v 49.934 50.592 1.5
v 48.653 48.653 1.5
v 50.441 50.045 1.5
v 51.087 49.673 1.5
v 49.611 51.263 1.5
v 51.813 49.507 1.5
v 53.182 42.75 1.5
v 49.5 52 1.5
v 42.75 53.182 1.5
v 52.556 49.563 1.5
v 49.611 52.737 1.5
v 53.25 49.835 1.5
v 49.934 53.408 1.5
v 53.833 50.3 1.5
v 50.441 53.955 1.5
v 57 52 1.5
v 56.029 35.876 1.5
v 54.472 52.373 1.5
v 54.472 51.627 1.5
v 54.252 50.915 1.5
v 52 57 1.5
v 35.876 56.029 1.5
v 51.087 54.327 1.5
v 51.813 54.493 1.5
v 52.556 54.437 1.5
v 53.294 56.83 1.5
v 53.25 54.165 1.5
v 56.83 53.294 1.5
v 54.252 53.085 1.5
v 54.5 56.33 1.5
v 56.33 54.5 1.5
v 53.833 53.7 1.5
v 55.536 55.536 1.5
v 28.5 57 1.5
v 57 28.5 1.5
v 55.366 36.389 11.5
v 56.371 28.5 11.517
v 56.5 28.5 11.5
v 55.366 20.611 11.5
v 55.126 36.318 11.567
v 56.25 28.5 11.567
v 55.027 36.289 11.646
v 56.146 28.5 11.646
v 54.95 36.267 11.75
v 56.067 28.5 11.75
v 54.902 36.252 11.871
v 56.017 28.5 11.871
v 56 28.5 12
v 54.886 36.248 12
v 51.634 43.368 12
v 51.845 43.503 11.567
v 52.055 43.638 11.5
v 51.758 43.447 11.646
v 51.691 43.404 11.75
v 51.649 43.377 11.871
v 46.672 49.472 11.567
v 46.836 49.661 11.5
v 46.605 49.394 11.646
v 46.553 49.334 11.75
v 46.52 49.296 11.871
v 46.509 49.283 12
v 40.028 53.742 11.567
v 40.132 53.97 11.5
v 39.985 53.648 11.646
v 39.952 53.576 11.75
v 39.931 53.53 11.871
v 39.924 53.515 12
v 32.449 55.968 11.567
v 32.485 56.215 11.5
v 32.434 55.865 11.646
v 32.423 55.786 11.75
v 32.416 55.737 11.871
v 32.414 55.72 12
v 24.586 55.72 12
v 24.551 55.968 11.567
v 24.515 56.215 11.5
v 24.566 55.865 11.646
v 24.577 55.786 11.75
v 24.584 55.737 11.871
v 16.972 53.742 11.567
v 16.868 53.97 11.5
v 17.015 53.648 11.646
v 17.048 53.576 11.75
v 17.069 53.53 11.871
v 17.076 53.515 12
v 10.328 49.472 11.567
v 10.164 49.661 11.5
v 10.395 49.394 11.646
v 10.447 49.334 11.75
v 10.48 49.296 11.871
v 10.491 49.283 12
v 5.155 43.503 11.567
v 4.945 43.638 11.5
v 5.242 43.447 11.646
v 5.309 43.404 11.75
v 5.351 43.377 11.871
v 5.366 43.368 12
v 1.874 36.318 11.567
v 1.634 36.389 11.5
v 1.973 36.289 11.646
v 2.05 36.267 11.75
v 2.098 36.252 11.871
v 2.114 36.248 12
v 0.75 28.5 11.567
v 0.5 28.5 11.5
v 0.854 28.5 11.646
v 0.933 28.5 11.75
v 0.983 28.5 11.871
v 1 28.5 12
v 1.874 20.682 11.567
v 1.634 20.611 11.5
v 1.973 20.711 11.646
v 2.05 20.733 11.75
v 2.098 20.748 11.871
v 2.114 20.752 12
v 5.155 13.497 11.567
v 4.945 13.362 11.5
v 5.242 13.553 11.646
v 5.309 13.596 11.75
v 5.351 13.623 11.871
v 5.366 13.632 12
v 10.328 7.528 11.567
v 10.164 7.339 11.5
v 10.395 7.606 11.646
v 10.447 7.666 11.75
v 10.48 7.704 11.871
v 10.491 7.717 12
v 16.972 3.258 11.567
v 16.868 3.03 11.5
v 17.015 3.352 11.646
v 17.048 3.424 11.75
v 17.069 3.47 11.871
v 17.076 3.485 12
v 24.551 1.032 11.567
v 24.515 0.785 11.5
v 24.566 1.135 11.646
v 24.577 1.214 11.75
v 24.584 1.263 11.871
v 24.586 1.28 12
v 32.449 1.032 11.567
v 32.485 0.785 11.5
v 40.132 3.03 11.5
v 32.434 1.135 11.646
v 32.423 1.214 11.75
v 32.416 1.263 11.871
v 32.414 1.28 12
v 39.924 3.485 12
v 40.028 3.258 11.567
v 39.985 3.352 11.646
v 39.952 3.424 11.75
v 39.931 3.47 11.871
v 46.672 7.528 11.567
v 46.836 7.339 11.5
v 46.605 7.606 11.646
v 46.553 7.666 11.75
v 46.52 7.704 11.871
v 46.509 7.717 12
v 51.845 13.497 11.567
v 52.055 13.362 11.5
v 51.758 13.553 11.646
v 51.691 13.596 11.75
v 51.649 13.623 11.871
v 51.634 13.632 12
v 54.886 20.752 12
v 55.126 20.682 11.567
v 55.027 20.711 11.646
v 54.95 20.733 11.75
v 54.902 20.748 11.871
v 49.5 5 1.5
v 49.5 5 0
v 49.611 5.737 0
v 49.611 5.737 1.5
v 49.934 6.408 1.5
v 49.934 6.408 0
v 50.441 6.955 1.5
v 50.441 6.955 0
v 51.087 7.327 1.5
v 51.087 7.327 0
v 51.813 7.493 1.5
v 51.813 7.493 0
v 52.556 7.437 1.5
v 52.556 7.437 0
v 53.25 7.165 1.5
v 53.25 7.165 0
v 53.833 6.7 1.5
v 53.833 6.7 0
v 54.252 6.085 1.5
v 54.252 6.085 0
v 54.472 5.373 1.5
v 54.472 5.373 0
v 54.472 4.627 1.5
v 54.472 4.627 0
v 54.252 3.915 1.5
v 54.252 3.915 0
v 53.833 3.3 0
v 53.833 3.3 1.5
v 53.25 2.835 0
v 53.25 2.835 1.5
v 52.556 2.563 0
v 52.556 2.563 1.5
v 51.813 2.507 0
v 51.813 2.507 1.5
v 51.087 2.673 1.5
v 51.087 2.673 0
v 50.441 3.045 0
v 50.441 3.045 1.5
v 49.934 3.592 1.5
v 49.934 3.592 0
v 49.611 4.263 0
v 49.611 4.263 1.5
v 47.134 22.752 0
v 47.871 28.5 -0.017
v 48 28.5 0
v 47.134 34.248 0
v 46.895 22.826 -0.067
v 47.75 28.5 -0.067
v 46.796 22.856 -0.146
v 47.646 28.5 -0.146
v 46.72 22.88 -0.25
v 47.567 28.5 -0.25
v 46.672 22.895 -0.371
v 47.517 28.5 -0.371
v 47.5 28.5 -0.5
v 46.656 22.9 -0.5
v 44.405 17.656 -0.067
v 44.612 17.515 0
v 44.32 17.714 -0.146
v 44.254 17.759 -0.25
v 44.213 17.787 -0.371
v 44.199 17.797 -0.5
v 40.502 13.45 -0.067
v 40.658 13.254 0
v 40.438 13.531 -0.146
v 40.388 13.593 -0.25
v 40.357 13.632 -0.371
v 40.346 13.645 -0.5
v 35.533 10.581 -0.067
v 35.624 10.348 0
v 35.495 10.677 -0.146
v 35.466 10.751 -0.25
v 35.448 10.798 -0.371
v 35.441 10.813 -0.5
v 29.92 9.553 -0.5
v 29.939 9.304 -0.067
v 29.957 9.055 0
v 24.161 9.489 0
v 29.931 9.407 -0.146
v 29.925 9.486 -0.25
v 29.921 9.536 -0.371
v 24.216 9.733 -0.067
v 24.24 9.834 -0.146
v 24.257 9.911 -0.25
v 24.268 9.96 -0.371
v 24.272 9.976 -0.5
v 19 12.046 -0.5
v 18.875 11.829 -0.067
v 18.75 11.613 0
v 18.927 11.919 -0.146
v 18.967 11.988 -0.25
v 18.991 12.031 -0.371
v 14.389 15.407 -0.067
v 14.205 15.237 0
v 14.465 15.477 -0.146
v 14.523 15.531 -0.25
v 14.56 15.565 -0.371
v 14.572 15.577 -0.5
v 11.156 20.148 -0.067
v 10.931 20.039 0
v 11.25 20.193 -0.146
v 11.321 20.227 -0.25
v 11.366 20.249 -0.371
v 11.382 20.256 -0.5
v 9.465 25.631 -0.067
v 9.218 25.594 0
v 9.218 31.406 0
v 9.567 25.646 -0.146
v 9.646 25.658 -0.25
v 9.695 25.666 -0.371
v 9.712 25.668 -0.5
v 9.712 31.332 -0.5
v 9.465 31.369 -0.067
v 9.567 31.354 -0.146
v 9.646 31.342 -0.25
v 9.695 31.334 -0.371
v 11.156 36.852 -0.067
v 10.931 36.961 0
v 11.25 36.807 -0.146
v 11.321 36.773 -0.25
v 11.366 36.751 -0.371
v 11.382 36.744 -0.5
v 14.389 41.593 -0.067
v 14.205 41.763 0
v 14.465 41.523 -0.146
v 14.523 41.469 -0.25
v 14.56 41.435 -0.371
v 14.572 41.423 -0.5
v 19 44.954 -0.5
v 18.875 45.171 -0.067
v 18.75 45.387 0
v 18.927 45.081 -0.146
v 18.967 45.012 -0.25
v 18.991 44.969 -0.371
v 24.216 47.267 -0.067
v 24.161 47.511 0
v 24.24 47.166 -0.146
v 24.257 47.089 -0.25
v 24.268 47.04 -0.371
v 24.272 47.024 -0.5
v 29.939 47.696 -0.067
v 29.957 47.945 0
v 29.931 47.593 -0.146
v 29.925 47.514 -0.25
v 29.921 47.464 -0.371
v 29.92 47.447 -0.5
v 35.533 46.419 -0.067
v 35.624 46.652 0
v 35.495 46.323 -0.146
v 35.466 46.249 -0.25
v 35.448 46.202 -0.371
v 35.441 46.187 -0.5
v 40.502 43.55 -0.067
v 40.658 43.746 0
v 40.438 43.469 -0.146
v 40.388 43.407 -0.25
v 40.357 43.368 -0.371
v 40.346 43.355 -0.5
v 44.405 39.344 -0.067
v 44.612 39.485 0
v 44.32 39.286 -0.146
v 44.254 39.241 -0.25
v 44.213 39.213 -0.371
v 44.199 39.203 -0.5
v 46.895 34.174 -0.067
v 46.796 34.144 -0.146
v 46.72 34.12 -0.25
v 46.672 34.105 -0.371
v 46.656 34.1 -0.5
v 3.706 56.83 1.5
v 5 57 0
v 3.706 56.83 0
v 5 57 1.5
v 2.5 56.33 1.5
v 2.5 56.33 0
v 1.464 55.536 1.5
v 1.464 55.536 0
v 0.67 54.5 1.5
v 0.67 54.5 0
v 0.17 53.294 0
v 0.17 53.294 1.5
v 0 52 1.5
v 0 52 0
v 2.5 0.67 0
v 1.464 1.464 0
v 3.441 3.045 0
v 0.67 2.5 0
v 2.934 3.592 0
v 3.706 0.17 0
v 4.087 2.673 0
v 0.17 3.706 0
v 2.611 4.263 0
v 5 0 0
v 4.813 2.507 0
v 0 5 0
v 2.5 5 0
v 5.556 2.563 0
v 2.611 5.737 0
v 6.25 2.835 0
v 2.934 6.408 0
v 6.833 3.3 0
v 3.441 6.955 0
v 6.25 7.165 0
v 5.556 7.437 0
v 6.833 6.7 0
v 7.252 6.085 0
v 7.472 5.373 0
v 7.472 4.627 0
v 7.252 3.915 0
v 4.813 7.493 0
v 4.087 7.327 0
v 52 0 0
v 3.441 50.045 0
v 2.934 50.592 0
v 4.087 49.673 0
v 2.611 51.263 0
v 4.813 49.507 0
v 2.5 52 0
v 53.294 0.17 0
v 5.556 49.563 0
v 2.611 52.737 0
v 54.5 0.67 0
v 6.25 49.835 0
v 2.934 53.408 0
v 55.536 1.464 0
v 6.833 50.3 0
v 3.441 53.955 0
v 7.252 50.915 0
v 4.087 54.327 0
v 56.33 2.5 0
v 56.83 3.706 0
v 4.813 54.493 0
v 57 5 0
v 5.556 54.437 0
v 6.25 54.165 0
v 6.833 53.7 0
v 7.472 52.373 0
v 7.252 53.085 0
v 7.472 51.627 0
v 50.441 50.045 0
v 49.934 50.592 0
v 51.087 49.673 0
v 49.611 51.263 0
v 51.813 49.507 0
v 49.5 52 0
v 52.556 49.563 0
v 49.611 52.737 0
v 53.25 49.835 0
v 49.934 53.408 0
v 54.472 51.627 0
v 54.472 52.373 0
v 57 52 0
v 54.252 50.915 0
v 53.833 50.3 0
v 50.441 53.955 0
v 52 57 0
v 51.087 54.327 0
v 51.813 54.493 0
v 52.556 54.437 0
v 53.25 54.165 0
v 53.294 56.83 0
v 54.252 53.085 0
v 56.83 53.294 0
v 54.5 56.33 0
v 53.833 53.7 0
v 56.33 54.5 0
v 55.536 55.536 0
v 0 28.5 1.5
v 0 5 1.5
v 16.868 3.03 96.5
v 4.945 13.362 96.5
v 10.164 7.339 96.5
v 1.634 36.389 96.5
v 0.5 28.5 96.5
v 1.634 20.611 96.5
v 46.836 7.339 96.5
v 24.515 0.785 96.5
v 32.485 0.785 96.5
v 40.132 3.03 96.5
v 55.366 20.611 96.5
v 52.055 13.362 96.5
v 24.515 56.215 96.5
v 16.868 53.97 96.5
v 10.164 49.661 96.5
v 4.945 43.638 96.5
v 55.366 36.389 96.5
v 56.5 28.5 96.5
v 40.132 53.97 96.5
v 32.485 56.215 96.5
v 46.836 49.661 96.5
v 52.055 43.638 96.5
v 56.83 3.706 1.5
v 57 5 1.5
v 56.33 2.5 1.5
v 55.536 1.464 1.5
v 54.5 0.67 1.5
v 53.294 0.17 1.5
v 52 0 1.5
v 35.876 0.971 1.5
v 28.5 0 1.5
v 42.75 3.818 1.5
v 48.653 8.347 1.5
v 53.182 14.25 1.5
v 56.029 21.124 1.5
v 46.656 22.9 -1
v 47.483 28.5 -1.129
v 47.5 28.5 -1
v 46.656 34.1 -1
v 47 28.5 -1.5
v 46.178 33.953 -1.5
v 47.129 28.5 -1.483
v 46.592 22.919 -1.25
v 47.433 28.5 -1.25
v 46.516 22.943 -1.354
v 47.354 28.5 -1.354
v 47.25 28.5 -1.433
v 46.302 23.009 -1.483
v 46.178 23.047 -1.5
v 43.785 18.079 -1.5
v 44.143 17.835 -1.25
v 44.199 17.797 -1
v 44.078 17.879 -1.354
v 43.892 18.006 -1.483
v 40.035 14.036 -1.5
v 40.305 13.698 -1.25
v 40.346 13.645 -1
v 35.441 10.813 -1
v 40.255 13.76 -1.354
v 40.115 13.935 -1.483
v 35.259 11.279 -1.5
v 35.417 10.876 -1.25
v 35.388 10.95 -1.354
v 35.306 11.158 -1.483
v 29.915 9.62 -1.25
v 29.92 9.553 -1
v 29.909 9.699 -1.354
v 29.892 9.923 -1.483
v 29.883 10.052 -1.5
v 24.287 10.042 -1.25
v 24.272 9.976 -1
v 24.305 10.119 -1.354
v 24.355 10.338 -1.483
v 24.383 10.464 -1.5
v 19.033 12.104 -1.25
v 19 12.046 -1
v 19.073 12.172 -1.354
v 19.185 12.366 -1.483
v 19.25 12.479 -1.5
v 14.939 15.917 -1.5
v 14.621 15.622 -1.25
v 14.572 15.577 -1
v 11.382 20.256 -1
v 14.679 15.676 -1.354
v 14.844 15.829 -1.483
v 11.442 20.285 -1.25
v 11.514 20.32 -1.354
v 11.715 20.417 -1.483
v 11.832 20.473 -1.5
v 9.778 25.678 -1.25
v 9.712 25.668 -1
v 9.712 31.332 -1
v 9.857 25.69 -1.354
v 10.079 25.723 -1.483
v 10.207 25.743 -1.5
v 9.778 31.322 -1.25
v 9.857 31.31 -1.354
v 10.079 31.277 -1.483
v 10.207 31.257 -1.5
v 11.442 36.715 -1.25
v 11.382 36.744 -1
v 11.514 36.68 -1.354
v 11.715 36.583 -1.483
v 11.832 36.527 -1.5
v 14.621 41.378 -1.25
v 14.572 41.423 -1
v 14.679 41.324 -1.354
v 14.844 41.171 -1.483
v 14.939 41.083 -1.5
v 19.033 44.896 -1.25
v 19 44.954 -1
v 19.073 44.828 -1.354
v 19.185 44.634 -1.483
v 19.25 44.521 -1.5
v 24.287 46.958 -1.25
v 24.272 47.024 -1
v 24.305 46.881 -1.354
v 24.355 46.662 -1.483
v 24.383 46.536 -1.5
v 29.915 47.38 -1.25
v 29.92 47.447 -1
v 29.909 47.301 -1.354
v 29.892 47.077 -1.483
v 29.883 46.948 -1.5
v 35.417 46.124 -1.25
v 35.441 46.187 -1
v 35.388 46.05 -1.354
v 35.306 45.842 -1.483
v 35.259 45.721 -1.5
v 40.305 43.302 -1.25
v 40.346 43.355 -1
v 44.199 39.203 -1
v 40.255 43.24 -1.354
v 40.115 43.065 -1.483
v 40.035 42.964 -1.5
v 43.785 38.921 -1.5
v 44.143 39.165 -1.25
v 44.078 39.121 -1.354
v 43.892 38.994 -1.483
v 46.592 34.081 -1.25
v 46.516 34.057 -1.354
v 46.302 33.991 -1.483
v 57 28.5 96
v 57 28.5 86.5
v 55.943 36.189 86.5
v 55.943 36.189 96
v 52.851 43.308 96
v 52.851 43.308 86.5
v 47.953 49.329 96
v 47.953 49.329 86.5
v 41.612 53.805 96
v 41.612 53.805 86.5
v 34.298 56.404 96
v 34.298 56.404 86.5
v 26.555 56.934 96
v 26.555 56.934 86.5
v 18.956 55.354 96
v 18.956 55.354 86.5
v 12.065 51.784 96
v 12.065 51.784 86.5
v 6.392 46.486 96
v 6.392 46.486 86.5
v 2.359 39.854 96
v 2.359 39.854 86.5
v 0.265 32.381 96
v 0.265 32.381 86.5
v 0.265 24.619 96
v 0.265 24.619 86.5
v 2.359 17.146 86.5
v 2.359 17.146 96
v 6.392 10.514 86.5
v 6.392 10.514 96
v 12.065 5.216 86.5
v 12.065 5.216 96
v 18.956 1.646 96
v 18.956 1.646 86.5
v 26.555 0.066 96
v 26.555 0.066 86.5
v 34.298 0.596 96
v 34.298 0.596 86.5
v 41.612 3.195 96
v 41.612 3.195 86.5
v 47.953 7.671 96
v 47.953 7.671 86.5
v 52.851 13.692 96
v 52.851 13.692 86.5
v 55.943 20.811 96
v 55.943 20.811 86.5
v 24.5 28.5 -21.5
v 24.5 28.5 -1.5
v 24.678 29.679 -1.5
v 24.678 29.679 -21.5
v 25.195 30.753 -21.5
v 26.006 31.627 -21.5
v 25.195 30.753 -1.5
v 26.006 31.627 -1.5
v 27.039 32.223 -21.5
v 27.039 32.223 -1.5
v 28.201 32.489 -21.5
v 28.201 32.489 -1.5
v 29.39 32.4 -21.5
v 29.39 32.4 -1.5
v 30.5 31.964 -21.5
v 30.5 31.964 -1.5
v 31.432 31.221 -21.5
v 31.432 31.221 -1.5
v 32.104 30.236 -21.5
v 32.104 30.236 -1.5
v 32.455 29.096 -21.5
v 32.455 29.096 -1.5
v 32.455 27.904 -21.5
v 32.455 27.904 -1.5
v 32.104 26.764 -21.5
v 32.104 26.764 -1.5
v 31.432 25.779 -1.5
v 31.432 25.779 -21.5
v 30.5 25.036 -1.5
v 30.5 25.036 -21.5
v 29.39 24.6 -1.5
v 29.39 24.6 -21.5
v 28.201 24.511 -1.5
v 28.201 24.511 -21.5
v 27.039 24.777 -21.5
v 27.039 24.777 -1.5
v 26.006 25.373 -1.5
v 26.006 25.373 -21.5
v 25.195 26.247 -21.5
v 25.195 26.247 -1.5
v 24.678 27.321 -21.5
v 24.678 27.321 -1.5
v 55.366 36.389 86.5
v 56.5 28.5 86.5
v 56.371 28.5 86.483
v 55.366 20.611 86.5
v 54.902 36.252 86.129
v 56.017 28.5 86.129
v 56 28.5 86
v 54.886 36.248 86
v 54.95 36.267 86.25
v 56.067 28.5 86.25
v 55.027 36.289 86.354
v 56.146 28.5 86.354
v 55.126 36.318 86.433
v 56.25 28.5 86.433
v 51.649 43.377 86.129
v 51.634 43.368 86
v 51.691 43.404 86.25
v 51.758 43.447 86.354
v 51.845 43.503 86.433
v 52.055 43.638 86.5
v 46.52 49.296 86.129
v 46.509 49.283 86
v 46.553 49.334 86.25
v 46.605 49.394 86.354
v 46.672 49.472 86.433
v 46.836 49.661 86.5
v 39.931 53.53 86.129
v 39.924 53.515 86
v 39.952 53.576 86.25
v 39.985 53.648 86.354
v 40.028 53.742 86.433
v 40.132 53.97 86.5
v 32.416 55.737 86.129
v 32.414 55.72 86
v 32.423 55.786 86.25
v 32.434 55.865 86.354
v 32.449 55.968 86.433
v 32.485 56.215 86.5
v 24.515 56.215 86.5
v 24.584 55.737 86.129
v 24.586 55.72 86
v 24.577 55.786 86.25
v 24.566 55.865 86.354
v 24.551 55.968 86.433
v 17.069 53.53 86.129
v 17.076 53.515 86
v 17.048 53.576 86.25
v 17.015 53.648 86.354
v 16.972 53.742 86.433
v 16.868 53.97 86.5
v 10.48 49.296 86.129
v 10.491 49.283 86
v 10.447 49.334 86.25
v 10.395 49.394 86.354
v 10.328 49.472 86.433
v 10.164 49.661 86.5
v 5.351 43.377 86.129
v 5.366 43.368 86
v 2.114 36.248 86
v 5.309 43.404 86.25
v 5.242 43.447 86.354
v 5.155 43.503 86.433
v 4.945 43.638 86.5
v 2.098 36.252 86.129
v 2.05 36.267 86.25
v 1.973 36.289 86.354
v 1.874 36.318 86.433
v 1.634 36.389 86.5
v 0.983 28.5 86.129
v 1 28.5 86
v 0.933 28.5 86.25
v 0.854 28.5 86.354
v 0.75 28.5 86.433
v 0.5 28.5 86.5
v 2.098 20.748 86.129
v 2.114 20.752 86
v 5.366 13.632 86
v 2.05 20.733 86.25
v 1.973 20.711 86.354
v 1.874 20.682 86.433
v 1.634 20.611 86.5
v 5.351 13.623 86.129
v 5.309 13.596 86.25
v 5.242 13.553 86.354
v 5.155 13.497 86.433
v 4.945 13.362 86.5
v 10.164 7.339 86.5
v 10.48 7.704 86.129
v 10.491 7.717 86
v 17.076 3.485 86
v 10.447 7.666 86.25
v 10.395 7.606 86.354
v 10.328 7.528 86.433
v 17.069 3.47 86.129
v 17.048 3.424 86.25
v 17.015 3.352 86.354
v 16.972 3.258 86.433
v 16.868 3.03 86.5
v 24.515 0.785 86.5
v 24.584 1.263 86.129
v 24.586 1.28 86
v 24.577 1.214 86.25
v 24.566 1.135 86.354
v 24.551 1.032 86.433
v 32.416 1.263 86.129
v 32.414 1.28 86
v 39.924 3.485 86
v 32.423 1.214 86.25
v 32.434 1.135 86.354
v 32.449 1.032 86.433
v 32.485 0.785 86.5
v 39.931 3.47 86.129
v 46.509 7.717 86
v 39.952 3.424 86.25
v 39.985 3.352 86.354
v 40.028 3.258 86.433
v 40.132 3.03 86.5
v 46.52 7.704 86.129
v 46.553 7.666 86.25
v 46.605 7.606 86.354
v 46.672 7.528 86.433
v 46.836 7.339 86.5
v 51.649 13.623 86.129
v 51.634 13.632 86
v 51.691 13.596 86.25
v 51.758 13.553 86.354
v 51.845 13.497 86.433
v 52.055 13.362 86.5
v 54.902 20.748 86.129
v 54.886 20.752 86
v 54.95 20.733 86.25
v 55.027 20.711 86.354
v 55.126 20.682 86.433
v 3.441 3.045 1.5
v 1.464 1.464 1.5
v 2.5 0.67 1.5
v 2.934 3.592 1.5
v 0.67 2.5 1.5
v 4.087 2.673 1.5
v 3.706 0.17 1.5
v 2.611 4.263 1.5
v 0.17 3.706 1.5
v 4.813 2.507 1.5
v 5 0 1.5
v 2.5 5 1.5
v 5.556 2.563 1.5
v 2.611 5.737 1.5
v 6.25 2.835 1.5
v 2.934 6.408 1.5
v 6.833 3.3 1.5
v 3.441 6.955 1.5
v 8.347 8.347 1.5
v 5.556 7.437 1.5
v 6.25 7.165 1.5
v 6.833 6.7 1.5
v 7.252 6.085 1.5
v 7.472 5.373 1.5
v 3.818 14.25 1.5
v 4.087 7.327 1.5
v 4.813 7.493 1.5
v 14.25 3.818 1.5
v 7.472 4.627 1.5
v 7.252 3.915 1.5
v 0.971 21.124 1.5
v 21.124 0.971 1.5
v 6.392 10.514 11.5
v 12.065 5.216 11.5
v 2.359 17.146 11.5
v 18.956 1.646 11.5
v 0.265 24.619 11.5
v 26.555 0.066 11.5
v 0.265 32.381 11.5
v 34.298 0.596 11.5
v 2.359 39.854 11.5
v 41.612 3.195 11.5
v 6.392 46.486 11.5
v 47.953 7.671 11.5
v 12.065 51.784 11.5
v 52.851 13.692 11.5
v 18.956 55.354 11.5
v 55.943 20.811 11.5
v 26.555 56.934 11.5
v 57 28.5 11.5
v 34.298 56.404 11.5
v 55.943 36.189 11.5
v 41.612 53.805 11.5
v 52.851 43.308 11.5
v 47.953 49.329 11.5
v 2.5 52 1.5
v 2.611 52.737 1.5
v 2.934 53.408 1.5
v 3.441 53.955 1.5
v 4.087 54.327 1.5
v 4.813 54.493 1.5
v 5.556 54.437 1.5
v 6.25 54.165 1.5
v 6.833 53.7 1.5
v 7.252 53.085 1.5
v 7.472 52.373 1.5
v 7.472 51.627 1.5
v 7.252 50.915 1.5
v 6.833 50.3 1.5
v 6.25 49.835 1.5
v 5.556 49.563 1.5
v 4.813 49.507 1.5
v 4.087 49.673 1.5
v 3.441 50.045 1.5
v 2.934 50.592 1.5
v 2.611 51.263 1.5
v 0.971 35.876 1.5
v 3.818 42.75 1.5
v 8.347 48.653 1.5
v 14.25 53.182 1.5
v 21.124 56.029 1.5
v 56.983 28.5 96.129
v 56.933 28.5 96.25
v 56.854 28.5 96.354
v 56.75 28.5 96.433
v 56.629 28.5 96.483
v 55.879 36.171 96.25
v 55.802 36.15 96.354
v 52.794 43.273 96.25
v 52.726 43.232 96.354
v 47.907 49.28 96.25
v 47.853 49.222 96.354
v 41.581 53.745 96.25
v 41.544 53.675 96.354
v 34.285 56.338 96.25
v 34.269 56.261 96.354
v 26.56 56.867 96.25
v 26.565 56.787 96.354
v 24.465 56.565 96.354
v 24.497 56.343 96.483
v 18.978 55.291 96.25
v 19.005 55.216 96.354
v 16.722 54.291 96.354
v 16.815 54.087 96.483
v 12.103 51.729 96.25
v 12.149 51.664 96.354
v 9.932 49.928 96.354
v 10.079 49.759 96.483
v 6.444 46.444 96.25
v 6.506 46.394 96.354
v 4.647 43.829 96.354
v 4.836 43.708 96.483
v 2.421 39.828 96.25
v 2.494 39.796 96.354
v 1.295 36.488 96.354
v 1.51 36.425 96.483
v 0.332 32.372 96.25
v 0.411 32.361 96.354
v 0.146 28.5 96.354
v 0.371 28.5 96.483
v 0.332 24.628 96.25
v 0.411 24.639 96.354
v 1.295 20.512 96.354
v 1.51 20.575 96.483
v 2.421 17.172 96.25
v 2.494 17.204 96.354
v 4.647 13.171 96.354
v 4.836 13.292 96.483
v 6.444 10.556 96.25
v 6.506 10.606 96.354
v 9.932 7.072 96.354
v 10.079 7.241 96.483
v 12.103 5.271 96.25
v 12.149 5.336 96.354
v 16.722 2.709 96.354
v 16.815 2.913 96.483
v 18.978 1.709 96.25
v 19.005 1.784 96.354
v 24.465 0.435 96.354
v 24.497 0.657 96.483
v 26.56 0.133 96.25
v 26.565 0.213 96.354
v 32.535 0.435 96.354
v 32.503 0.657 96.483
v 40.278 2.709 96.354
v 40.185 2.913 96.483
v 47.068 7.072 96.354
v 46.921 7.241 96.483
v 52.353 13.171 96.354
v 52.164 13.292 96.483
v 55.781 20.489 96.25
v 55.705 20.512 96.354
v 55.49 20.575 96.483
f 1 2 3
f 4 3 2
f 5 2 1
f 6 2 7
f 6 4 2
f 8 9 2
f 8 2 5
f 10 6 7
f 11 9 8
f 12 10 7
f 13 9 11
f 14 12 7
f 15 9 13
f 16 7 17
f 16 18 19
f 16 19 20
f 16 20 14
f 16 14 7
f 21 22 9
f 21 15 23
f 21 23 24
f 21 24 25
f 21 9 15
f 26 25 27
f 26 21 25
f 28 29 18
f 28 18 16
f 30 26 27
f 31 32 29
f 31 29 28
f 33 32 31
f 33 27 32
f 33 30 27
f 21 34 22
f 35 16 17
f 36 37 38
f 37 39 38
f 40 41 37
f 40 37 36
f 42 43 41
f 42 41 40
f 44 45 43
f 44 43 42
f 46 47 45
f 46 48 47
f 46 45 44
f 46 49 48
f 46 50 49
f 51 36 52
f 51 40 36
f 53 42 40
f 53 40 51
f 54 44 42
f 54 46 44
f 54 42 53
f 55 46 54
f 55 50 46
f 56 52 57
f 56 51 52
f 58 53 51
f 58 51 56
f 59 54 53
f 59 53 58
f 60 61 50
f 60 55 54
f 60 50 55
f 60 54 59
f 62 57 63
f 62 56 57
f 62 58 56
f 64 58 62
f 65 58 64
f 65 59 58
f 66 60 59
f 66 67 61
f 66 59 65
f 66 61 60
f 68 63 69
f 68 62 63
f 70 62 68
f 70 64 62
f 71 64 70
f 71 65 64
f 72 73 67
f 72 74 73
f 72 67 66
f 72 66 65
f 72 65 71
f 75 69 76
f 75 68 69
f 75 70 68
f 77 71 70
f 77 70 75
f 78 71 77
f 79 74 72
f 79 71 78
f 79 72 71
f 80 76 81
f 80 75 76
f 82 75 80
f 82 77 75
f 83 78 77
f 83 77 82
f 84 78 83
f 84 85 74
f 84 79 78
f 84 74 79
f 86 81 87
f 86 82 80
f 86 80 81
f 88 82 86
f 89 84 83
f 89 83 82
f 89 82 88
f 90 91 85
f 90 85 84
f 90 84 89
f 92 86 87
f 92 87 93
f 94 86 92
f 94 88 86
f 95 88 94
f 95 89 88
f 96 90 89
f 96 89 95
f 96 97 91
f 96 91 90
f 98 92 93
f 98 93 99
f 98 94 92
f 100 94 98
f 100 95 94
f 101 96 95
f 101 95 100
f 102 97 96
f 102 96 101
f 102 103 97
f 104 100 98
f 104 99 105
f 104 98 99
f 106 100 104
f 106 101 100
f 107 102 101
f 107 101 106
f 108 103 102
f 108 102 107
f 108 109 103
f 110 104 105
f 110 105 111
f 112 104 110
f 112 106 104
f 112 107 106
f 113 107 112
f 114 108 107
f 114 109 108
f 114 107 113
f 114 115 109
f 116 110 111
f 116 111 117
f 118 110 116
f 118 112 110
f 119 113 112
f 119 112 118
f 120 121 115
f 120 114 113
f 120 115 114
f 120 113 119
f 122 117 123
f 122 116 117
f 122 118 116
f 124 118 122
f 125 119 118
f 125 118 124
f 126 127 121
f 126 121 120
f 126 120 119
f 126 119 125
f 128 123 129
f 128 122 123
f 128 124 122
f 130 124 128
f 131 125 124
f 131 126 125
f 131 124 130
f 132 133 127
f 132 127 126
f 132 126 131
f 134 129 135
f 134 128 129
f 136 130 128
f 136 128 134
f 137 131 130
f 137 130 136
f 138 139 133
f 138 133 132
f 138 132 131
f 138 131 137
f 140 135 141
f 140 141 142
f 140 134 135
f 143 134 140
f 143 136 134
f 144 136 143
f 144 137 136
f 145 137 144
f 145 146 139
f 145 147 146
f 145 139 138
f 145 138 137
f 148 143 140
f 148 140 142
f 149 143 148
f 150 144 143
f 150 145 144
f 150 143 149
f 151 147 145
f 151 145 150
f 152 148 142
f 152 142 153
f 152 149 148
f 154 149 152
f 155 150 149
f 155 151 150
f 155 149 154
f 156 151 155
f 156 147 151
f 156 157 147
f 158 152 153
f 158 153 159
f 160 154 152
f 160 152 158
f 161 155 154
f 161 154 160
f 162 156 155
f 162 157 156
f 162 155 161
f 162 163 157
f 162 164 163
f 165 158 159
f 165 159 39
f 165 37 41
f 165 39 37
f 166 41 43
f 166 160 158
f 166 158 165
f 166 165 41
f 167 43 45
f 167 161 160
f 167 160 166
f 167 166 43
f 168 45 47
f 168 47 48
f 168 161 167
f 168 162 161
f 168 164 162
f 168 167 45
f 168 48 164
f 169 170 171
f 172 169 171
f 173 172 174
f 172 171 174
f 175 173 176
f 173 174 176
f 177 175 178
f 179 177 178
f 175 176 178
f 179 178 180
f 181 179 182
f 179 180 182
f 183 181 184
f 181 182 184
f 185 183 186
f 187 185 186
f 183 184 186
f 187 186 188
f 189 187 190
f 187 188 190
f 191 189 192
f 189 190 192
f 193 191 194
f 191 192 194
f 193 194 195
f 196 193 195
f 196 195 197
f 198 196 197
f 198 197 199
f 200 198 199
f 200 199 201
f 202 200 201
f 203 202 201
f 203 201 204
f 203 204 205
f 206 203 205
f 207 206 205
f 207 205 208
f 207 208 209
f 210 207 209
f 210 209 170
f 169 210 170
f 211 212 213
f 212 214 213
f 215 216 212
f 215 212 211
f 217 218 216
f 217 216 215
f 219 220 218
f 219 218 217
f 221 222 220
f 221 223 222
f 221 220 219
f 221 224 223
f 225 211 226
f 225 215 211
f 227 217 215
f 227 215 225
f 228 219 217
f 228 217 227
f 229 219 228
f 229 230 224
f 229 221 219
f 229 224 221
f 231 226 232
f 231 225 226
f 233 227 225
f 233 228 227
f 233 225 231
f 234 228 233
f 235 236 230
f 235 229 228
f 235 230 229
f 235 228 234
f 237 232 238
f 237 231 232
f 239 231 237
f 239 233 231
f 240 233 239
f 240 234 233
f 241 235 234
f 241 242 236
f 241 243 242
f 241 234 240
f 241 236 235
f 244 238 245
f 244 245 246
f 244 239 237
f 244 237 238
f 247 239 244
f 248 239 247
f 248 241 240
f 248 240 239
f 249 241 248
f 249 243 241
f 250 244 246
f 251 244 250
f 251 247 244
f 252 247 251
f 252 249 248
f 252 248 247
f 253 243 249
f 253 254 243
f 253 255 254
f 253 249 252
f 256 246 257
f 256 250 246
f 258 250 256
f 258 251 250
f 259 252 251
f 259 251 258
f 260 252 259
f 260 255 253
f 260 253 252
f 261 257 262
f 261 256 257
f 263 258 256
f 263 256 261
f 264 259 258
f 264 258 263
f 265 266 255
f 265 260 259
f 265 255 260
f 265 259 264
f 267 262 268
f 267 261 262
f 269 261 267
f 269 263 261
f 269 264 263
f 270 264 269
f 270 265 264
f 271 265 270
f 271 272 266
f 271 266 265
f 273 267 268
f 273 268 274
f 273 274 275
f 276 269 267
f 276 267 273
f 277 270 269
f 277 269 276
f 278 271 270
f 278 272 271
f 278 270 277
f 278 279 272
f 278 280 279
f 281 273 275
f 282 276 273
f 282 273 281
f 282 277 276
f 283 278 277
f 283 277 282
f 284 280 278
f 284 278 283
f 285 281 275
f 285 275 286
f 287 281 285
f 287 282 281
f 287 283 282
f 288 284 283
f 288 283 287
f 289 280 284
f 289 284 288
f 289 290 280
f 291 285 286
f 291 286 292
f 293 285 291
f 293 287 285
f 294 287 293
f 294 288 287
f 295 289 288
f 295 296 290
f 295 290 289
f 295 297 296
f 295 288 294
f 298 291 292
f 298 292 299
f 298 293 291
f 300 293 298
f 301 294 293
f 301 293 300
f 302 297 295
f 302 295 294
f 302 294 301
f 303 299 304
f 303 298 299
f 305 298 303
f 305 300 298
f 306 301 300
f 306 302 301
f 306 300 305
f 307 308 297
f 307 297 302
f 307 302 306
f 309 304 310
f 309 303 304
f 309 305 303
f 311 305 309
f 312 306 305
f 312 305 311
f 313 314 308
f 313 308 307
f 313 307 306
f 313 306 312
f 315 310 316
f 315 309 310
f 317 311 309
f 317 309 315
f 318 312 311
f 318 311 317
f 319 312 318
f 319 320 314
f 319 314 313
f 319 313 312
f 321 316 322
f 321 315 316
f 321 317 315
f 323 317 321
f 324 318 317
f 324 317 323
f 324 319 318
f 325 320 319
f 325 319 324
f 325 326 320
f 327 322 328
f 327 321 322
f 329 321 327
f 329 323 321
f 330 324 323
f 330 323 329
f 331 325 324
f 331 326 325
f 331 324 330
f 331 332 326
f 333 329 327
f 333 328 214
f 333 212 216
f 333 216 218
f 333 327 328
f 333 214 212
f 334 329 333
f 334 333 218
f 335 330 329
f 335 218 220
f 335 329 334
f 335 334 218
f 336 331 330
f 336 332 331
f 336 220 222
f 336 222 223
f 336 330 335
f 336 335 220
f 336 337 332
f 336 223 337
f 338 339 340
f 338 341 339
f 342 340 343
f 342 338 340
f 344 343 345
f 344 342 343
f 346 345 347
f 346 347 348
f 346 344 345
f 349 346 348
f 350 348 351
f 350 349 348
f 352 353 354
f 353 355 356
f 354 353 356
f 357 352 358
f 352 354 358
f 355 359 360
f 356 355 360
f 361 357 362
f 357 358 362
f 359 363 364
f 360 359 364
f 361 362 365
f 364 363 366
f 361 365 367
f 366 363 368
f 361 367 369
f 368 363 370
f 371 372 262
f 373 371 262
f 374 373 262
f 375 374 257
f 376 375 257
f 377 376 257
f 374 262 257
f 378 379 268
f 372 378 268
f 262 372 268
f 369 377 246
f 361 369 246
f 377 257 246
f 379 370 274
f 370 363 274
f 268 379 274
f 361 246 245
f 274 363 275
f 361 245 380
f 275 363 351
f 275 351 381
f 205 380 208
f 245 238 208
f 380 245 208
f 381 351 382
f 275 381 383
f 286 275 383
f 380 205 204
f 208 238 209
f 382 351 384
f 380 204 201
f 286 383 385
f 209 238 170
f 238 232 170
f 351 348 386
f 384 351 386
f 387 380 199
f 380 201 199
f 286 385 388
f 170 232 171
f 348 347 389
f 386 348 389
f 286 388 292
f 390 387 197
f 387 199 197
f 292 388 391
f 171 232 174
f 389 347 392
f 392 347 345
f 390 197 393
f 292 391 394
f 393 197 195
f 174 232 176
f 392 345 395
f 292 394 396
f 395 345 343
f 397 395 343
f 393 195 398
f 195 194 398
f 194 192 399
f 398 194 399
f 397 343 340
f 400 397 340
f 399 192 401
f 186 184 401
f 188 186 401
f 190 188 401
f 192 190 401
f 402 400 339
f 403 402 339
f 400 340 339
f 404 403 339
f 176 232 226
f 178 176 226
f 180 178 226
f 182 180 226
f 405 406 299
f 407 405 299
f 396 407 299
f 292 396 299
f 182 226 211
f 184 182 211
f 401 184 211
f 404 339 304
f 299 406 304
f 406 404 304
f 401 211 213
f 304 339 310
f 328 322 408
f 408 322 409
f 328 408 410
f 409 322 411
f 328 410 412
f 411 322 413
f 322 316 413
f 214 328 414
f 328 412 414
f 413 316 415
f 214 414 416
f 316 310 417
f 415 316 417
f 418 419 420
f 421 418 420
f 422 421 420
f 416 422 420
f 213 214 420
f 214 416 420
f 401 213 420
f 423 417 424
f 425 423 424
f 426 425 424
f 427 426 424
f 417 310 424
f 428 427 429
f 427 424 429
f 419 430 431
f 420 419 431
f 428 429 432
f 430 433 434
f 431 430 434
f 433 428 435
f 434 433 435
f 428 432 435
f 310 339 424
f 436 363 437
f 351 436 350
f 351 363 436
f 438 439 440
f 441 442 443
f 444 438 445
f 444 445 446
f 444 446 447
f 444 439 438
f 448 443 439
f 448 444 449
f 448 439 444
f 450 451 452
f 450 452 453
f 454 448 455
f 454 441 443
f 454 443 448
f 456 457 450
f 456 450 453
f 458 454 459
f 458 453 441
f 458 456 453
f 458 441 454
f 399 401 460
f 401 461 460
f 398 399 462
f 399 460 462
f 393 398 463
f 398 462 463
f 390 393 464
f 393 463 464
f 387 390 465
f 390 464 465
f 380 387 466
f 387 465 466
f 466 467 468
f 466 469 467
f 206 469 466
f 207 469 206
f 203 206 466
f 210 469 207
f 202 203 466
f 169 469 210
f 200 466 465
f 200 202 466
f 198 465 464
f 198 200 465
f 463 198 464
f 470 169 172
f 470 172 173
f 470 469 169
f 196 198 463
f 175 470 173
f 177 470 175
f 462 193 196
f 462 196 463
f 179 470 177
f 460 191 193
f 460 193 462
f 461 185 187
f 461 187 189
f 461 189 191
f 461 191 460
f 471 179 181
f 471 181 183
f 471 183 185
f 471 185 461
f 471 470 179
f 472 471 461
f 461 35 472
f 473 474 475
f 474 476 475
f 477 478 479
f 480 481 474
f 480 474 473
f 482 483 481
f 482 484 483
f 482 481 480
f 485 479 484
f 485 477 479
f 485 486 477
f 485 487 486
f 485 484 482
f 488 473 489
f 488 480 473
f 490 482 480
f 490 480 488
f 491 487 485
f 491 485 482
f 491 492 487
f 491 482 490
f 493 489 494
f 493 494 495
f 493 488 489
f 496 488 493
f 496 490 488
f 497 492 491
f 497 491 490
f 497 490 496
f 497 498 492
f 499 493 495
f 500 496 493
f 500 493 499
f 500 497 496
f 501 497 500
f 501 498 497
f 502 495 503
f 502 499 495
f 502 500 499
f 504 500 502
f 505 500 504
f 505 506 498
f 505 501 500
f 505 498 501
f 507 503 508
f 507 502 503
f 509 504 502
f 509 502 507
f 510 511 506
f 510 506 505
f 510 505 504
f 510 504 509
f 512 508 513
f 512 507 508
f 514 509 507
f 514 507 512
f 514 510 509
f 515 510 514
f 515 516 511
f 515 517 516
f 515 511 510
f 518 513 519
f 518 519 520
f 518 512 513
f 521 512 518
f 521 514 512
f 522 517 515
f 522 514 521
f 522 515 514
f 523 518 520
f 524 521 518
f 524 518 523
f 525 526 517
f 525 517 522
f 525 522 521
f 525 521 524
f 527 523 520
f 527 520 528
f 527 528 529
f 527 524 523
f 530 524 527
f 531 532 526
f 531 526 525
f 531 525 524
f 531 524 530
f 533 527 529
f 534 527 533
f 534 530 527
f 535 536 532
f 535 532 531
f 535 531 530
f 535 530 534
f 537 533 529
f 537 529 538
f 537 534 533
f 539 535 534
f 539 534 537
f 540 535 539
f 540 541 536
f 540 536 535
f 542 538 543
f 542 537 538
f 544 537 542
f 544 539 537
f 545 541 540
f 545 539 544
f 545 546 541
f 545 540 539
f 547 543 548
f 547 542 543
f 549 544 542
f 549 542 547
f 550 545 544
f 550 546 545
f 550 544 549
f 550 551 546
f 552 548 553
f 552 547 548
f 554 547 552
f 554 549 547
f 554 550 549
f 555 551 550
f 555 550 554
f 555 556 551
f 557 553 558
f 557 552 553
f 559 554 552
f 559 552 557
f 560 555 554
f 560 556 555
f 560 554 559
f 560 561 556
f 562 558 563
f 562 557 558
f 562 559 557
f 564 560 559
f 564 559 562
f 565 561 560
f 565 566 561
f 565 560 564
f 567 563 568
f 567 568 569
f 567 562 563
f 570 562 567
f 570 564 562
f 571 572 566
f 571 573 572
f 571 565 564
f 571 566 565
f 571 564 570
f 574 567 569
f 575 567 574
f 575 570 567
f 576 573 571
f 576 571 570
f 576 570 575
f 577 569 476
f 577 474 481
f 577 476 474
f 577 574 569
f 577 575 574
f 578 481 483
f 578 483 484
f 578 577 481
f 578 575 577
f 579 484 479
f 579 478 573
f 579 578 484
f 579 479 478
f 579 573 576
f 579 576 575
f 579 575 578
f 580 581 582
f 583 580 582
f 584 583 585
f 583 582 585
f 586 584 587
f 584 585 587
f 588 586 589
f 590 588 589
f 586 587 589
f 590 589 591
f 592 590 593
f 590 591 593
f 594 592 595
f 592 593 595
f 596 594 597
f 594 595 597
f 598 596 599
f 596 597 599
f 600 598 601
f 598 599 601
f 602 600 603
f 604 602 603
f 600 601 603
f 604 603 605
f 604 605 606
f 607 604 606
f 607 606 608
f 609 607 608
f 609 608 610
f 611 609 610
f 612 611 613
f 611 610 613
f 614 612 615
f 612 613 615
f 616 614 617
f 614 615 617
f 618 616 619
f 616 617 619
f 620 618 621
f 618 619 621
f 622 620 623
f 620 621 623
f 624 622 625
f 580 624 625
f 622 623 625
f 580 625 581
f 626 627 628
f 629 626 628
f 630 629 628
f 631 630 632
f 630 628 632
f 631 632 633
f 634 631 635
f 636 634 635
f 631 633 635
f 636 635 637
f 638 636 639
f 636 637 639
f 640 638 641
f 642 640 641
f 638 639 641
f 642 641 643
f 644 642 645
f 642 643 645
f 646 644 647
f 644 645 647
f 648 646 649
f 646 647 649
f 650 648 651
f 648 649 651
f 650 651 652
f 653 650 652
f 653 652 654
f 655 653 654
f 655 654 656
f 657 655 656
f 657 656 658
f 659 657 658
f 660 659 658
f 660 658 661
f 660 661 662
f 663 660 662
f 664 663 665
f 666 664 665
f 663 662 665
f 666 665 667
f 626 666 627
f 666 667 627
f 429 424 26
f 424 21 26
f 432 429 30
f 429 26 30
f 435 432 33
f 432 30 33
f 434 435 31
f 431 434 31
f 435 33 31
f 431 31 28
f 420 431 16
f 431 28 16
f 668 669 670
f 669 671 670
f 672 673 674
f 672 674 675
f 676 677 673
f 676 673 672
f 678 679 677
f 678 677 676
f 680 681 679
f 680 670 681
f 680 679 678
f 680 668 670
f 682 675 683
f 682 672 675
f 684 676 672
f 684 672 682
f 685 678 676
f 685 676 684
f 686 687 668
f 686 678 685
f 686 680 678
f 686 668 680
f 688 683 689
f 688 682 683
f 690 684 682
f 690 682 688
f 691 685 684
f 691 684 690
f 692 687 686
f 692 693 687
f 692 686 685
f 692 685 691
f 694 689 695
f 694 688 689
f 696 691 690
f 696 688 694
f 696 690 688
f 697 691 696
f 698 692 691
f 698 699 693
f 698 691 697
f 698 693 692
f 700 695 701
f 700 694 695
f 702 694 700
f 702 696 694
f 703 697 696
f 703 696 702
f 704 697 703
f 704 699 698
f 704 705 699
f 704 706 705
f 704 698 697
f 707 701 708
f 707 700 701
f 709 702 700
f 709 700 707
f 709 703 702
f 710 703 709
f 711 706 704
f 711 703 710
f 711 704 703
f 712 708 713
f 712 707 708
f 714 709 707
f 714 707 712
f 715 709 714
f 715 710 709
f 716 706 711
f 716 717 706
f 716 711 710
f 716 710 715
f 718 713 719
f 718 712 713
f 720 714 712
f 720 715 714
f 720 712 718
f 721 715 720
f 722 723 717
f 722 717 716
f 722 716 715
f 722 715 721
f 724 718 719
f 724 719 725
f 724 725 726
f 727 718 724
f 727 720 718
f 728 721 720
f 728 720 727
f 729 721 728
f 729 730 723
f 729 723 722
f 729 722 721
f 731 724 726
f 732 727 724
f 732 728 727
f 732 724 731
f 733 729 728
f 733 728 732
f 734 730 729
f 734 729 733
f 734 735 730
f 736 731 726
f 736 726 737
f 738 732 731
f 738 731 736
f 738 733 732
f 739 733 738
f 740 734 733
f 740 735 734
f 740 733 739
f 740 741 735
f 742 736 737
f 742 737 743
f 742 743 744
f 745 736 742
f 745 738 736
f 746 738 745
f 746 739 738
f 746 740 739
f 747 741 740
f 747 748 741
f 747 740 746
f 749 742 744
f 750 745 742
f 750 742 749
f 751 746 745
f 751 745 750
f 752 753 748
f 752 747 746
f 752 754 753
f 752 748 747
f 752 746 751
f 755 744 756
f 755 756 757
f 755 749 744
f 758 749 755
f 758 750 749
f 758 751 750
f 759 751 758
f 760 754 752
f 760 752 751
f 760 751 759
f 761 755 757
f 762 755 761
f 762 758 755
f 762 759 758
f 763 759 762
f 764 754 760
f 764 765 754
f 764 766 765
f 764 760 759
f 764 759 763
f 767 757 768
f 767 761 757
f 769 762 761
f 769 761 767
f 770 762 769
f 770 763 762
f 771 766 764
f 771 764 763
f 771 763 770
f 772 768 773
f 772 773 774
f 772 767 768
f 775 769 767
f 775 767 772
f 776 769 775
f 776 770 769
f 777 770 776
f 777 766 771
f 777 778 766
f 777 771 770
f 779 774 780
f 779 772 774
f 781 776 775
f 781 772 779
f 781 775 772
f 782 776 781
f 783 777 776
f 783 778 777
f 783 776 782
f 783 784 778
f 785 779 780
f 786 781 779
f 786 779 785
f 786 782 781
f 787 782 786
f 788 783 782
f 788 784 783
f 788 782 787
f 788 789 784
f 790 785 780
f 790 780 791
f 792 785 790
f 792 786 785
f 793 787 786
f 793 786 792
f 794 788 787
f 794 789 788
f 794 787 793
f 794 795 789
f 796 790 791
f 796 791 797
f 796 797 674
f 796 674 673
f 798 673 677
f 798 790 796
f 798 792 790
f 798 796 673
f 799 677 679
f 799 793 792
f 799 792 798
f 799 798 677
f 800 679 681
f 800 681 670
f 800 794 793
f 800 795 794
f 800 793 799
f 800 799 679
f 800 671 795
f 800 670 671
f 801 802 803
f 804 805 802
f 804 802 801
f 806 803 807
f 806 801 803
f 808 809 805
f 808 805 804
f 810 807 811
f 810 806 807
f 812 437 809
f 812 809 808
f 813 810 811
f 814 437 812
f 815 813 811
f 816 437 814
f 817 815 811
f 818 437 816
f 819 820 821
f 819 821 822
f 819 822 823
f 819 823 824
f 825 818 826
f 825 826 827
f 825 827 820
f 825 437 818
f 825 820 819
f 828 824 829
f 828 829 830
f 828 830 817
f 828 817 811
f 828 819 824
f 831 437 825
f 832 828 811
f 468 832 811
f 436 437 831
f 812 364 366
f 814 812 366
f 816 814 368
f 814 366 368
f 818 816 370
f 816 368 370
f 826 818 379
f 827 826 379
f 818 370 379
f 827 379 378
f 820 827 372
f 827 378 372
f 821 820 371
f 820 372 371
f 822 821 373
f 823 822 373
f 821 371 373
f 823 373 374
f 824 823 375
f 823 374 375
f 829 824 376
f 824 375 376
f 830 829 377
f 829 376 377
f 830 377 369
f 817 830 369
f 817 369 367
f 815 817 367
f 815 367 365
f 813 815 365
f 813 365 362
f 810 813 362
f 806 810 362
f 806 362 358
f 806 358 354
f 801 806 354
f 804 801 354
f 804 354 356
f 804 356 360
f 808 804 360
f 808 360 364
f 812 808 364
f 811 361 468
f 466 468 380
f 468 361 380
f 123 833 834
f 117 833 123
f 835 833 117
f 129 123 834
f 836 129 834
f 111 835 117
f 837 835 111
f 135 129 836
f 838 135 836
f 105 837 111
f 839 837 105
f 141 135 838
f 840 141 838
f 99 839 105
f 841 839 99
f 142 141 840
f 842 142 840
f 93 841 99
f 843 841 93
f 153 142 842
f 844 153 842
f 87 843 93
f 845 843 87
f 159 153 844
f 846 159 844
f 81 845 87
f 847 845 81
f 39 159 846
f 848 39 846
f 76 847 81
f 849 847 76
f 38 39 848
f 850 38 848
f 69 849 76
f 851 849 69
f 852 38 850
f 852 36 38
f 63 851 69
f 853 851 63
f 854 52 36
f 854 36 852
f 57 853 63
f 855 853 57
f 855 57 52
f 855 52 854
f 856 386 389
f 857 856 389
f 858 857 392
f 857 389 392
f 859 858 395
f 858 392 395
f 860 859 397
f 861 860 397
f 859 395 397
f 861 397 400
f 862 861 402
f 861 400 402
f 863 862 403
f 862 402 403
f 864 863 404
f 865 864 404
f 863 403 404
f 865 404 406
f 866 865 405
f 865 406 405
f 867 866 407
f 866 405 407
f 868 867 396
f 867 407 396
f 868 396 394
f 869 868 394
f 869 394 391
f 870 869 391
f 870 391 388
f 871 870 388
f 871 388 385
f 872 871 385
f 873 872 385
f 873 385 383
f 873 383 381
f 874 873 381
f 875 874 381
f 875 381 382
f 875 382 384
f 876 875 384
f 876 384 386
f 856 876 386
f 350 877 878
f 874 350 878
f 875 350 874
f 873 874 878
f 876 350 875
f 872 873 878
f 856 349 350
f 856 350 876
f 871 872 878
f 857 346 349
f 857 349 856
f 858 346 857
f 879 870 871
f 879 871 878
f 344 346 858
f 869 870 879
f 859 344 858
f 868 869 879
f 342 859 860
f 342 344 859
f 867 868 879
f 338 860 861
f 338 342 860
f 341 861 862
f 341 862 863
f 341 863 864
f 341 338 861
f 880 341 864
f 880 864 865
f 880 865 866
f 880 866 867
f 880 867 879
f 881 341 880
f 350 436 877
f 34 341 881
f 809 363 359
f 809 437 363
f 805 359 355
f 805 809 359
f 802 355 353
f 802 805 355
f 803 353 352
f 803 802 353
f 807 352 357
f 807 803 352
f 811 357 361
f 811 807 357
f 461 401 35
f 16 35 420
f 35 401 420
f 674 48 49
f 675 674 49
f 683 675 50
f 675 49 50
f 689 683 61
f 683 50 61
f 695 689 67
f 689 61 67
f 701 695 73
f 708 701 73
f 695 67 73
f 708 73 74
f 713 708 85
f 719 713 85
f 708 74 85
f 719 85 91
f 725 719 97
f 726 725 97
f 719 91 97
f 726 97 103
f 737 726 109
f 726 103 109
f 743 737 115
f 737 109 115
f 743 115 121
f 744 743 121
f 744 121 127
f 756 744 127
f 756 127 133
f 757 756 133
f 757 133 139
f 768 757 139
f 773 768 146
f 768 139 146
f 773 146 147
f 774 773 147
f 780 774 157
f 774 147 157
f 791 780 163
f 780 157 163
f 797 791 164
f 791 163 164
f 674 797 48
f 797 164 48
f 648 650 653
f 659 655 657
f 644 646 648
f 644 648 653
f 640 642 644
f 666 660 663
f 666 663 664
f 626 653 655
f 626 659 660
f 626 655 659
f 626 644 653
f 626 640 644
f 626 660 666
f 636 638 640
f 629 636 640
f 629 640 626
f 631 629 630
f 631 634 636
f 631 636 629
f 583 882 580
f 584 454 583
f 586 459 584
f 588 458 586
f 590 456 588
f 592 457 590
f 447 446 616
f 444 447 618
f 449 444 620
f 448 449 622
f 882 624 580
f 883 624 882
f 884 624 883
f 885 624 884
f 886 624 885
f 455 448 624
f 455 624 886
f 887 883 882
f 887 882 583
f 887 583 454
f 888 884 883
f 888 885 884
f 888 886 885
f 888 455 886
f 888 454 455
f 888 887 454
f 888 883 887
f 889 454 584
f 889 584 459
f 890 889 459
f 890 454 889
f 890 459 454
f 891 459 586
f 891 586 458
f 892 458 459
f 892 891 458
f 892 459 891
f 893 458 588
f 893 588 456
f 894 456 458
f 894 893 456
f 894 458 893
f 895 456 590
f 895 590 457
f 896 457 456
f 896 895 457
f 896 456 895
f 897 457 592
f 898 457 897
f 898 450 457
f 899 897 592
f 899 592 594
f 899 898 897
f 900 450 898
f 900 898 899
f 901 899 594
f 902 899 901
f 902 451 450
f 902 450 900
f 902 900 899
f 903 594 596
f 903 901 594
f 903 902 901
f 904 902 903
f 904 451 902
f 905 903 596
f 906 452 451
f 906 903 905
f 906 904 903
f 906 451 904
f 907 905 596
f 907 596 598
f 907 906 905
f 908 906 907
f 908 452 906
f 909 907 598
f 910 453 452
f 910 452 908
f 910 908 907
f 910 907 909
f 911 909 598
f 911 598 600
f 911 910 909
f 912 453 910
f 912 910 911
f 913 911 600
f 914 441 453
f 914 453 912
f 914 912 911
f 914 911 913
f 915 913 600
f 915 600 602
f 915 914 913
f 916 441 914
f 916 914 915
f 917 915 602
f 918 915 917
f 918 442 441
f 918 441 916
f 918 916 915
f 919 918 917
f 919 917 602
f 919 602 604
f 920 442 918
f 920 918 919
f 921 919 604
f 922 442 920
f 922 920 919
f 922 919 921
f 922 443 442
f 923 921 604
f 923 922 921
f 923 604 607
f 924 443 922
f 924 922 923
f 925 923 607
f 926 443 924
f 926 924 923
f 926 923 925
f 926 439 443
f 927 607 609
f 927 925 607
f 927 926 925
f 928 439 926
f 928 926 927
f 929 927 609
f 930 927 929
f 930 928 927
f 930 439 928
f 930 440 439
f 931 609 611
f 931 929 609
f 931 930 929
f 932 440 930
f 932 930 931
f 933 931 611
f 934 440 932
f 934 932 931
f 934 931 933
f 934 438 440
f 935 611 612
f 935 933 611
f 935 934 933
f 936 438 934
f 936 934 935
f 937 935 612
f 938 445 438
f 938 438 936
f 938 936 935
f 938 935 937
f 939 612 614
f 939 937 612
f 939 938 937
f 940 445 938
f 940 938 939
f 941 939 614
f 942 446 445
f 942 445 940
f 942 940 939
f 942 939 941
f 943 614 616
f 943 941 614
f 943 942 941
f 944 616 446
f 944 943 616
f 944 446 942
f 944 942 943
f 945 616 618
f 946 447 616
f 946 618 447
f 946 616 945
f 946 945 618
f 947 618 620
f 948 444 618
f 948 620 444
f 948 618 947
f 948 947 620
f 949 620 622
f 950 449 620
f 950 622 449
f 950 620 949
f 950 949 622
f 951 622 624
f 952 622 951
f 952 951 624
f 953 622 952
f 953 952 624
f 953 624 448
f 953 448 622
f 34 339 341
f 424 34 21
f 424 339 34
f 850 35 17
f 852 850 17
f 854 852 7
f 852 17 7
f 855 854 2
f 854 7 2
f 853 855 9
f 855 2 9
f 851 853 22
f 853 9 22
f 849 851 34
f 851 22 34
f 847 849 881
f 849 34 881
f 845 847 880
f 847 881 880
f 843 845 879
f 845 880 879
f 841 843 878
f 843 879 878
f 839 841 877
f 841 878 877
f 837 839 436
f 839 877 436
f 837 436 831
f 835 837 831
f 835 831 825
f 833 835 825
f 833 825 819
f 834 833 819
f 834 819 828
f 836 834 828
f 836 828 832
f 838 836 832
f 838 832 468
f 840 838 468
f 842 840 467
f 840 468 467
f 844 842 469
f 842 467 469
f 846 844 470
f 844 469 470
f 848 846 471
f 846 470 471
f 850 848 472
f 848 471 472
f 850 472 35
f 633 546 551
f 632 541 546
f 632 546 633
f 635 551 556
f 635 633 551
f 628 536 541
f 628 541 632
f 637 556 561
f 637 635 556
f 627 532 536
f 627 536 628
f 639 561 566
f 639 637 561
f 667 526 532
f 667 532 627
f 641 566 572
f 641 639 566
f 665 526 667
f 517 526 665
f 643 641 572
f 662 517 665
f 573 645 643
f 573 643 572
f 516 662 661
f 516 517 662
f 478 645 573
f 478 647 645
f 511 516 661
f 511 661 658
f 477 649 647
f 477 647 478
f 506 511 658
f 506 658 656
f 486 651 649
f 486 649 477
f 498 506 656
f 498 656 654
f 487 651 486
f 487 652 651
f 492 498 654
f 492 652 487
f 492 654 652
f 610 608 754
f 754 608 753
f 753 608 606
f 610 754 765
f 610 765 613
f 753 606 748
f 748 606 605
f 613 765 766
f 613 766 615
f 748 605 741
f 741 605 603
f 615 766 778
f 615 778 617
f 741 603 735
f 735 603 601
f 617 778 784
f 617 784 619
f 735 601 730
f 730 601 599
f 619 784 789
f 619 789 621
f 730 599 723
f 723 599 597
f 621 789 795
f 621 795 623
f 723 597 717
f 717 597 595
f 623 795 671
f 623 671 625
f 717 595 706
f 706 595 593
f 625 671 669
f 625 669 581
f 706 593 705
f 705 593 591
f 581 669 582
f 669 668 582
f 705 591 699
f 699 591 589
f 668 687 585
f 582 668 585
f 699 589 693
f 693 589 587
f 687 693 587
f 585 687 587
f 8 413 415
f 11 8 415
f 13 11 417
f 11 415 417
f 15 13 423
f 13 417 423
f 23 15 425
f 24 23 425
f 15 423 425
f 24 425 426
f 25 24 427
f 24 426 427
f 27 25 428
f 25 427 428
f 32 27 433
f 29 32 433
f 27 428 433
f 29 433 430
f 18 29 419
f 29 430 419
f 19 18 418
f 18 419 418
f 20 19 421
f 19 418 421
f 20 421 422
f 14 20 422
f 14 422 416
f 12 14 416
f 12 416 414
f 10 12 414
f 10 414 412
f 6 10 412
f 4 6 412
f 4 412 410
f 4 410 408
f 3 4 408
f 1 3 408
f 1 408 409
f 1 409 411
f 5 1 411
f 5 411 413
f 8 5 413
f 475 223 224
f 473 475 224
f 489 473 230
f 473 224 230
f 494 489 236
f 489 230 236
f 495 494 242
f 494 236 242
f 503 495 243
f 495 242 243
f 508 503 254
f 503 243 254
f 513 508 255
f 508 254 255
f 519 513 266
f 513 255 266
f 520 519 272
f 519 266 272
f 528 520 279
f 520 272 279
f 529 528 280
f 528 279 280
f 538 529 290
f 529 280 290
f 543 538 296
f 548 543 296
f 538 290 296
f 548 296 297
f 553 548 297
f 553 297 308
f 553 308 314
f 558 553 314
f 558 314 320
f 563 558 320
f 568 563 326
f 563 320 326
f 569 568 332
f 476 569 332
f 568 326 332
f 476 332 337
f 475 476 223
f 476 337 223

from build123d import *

# Parameters (mm, degrees)
SKETCH1_W           = 57
SKETCH1_H           = 57
BOSS_EXTRUDE1_DEPTH = 1.5
SKETCH2_R           = 28.5
BOSS_EXTRUDE2_DEPTH = 10
SKETCH3_R           = 27.5
BOSS_EXTRUDE3_DEPTH = 75
SKETCH4_R           = 28.5
BOSS_EXTRUDE4_DEPTH = 10
CUT_EXTRUDE1_REACH  = 127.739
SKETCH5_R           = 2.5
SKETCH6_R           = 19
BOSS_EXTRUDE5_DEPTH = 1.5
SKETCH7_R           = 4
BOSS_EXTRUDE6_DEPTH = 20
FILLET1_R           = 5
FILLET2_R           = 0.5


with BuildPart() as part:
    # Sketch1 → Boss-Extrude1 (new body)
    with BuildSketch(Plane.XY):
        with Locations((28.5, 28.5)):
            Rectangle(SKETCH1_W, SKETCH1_H)
    extrude(amount=BOSS_EXTRUDE1_DEPTH)

    # Sketch2 → Boss-Extrude2 (add)
    with BuildSketch(Plane.XY.offset(1.5)):
        with Locations((28.5, 28.5)):
            Circle(SKETCH2_R)
    extrude(amount=BOSS_EXTRUDE2_DEPTH)

    # Sketch3 → Boss-Extrude3 (add)
    with BuildSketch(Plane.XY.offset(11.5)):
        with Locations((28.5, 28.5)):
            Circle(SKETCH3_R)
    extrude(amount=BOSS_EXTRUDE3_DEPTH)

    # Sketch4 → Boss-Extrude4 (add)
    with BuildSketch(Plane.XY.offset(86.5)):
        with Locations((28.5, 28.5)):
            Circle(SKETCH4_R)
    extrude(amount=BOSS_EXTRUDE4_DEPTH)

    # Sketch5 → Cut-Extrude1 (cut, up to next)
    with BuildSketch(Plane(origin=(0, 0, 0), x_dir=(-1, 0, 0), z_dir=(0, 0, -1)), mode=Mode.PRIVATE) as cut_extrude1_sk1:
        with Locations((-52, 52)):
            Circle(SKETCH5_R)
    cut_extrude1_tool1 = extrude(cut_extrude1_sk1.sketch, amount=-CUT_EXTRUDE1_REACH, mode=Mode.PRIVATE) & part.part
    # Sketch5 → Cut-Extrude1 (cut, up to next)
    with BuildSketch(Plane(origin=(0, 0, 0), x_dir=(-1, 0, 0), z_dir=(0, 0, -1)), mode=Mode.PRIVATE) as cut_extrude1_sk2:
        with Locations((-5, 52)):
            Circle(SKETCH5_R)
    cut_extrude1_tool2 = extrude(cut_extrude1_sk2.sketch, amount=-CUT_EXTRUDE1_REACH, mode=Mode.PRIVATE) & part.part
    # Sketch5 → Cut-Extrude1 (cut, up to next)
    with BuildSketch(Plane(origin=(0, 0, 0), x_dir=(-1, 0, 0), z_dir=(0, 0, -1)), mode=Mode.PRIVATE) as cut_extrude1_sk3:
        with Locations((-5, 5)):
            Circle(SKETCH5_R)
    cut_extrude1_tool3 = extrude(cut_extrude1_sk3.sketch, amount=-CUT_EXTRUDE1_REACH, mode=Mode.PRIVATE) & part.part
    # Sketch5 → Cut-Extrude1 (cut, up to next)
    with BuildSketch(Plane(origin=(0, 0, 0), x_dir=(-1, 0, 0), z_dir=(0, 0, -1)), mode=Mode.PRIVATE) as cut_extrude1_sk4:
        with Locations((-52, 5)):
            Circle(SKETCH5_R)
    cut_extrude1_tool4 = extrude(cut_extrude1_sk4.sketch, amount=-CUT_EXTRUDE1_REACH, mode=Mode.PRIVATE) & part.part
    add(cut_extrude1_tool1.solids().sort_by_distance((52, 52, 0))[0], mode=Mode.SUBTRACT)
    add(cut_extrude1_tool2.solids().sort_by_distance((5, 52, 0))[0], mode=Mode.SUBTRACT)
    add(cut_extrude1_tool3.solids().sort_by_distance((5, 5, 0))[0], mode=Mode.SUBTRACT)
    add(cut_extrude1_tool4.solids().sort_by_distance((52, 5, 0))[0], mode=Mode.SUBTRACT)

    # Sketch6 → Boss-Extrude5 (add)
    with BuildSketch(Plane(origin=(0, 0, 0), x_dir=(-1, 0, 0), z_dir=(0, 0, -1))):
        with Locations(Location((-28.5, 28.5, 0), (0, 0, 180))):
            Circle(SKETCH6_R)
    extrude(amount=BOSS_EXTRUDE5_DEPTH)

    # Sketch7 → Boss-Extrude6 (add)
    with BuildSketch(Plane(origin=(0, 0, -1.5), x_dir=(-1, 0, 0), z_dir=(0, 0, -1))):
        with Locations((-28.5, 28.5)):
            Circle(SKETCH7_R)
    extrude(amount=BOSS_EXTRUDE6_DEPTH)

    # Fillet1
    fillet1_edges = [part.edges().sort_by_distance(p)[0] for p in [
        (0, 57, 0.75),
        (57, 57, 0.75),
        (57, 0, 0.75),
        (0, 0, 0.75),
    ]]
    fillet(fillet1_edges, radius=FILLET1_R)

    # Fillet2
    fillet2_edges = [part.edges().sort_by_distance(p)[0] for p in [
        (1, 28.5, 11.5),
        (1, 28.5, 86.5),
        (0, 28.5, 96.5),
        (9.5, 28.5, 0),
        (9.5, 28.5, -1.5),
    ]]
    fillet(fillet2_edges, radius=FILLET2_R)


solid = part.part
